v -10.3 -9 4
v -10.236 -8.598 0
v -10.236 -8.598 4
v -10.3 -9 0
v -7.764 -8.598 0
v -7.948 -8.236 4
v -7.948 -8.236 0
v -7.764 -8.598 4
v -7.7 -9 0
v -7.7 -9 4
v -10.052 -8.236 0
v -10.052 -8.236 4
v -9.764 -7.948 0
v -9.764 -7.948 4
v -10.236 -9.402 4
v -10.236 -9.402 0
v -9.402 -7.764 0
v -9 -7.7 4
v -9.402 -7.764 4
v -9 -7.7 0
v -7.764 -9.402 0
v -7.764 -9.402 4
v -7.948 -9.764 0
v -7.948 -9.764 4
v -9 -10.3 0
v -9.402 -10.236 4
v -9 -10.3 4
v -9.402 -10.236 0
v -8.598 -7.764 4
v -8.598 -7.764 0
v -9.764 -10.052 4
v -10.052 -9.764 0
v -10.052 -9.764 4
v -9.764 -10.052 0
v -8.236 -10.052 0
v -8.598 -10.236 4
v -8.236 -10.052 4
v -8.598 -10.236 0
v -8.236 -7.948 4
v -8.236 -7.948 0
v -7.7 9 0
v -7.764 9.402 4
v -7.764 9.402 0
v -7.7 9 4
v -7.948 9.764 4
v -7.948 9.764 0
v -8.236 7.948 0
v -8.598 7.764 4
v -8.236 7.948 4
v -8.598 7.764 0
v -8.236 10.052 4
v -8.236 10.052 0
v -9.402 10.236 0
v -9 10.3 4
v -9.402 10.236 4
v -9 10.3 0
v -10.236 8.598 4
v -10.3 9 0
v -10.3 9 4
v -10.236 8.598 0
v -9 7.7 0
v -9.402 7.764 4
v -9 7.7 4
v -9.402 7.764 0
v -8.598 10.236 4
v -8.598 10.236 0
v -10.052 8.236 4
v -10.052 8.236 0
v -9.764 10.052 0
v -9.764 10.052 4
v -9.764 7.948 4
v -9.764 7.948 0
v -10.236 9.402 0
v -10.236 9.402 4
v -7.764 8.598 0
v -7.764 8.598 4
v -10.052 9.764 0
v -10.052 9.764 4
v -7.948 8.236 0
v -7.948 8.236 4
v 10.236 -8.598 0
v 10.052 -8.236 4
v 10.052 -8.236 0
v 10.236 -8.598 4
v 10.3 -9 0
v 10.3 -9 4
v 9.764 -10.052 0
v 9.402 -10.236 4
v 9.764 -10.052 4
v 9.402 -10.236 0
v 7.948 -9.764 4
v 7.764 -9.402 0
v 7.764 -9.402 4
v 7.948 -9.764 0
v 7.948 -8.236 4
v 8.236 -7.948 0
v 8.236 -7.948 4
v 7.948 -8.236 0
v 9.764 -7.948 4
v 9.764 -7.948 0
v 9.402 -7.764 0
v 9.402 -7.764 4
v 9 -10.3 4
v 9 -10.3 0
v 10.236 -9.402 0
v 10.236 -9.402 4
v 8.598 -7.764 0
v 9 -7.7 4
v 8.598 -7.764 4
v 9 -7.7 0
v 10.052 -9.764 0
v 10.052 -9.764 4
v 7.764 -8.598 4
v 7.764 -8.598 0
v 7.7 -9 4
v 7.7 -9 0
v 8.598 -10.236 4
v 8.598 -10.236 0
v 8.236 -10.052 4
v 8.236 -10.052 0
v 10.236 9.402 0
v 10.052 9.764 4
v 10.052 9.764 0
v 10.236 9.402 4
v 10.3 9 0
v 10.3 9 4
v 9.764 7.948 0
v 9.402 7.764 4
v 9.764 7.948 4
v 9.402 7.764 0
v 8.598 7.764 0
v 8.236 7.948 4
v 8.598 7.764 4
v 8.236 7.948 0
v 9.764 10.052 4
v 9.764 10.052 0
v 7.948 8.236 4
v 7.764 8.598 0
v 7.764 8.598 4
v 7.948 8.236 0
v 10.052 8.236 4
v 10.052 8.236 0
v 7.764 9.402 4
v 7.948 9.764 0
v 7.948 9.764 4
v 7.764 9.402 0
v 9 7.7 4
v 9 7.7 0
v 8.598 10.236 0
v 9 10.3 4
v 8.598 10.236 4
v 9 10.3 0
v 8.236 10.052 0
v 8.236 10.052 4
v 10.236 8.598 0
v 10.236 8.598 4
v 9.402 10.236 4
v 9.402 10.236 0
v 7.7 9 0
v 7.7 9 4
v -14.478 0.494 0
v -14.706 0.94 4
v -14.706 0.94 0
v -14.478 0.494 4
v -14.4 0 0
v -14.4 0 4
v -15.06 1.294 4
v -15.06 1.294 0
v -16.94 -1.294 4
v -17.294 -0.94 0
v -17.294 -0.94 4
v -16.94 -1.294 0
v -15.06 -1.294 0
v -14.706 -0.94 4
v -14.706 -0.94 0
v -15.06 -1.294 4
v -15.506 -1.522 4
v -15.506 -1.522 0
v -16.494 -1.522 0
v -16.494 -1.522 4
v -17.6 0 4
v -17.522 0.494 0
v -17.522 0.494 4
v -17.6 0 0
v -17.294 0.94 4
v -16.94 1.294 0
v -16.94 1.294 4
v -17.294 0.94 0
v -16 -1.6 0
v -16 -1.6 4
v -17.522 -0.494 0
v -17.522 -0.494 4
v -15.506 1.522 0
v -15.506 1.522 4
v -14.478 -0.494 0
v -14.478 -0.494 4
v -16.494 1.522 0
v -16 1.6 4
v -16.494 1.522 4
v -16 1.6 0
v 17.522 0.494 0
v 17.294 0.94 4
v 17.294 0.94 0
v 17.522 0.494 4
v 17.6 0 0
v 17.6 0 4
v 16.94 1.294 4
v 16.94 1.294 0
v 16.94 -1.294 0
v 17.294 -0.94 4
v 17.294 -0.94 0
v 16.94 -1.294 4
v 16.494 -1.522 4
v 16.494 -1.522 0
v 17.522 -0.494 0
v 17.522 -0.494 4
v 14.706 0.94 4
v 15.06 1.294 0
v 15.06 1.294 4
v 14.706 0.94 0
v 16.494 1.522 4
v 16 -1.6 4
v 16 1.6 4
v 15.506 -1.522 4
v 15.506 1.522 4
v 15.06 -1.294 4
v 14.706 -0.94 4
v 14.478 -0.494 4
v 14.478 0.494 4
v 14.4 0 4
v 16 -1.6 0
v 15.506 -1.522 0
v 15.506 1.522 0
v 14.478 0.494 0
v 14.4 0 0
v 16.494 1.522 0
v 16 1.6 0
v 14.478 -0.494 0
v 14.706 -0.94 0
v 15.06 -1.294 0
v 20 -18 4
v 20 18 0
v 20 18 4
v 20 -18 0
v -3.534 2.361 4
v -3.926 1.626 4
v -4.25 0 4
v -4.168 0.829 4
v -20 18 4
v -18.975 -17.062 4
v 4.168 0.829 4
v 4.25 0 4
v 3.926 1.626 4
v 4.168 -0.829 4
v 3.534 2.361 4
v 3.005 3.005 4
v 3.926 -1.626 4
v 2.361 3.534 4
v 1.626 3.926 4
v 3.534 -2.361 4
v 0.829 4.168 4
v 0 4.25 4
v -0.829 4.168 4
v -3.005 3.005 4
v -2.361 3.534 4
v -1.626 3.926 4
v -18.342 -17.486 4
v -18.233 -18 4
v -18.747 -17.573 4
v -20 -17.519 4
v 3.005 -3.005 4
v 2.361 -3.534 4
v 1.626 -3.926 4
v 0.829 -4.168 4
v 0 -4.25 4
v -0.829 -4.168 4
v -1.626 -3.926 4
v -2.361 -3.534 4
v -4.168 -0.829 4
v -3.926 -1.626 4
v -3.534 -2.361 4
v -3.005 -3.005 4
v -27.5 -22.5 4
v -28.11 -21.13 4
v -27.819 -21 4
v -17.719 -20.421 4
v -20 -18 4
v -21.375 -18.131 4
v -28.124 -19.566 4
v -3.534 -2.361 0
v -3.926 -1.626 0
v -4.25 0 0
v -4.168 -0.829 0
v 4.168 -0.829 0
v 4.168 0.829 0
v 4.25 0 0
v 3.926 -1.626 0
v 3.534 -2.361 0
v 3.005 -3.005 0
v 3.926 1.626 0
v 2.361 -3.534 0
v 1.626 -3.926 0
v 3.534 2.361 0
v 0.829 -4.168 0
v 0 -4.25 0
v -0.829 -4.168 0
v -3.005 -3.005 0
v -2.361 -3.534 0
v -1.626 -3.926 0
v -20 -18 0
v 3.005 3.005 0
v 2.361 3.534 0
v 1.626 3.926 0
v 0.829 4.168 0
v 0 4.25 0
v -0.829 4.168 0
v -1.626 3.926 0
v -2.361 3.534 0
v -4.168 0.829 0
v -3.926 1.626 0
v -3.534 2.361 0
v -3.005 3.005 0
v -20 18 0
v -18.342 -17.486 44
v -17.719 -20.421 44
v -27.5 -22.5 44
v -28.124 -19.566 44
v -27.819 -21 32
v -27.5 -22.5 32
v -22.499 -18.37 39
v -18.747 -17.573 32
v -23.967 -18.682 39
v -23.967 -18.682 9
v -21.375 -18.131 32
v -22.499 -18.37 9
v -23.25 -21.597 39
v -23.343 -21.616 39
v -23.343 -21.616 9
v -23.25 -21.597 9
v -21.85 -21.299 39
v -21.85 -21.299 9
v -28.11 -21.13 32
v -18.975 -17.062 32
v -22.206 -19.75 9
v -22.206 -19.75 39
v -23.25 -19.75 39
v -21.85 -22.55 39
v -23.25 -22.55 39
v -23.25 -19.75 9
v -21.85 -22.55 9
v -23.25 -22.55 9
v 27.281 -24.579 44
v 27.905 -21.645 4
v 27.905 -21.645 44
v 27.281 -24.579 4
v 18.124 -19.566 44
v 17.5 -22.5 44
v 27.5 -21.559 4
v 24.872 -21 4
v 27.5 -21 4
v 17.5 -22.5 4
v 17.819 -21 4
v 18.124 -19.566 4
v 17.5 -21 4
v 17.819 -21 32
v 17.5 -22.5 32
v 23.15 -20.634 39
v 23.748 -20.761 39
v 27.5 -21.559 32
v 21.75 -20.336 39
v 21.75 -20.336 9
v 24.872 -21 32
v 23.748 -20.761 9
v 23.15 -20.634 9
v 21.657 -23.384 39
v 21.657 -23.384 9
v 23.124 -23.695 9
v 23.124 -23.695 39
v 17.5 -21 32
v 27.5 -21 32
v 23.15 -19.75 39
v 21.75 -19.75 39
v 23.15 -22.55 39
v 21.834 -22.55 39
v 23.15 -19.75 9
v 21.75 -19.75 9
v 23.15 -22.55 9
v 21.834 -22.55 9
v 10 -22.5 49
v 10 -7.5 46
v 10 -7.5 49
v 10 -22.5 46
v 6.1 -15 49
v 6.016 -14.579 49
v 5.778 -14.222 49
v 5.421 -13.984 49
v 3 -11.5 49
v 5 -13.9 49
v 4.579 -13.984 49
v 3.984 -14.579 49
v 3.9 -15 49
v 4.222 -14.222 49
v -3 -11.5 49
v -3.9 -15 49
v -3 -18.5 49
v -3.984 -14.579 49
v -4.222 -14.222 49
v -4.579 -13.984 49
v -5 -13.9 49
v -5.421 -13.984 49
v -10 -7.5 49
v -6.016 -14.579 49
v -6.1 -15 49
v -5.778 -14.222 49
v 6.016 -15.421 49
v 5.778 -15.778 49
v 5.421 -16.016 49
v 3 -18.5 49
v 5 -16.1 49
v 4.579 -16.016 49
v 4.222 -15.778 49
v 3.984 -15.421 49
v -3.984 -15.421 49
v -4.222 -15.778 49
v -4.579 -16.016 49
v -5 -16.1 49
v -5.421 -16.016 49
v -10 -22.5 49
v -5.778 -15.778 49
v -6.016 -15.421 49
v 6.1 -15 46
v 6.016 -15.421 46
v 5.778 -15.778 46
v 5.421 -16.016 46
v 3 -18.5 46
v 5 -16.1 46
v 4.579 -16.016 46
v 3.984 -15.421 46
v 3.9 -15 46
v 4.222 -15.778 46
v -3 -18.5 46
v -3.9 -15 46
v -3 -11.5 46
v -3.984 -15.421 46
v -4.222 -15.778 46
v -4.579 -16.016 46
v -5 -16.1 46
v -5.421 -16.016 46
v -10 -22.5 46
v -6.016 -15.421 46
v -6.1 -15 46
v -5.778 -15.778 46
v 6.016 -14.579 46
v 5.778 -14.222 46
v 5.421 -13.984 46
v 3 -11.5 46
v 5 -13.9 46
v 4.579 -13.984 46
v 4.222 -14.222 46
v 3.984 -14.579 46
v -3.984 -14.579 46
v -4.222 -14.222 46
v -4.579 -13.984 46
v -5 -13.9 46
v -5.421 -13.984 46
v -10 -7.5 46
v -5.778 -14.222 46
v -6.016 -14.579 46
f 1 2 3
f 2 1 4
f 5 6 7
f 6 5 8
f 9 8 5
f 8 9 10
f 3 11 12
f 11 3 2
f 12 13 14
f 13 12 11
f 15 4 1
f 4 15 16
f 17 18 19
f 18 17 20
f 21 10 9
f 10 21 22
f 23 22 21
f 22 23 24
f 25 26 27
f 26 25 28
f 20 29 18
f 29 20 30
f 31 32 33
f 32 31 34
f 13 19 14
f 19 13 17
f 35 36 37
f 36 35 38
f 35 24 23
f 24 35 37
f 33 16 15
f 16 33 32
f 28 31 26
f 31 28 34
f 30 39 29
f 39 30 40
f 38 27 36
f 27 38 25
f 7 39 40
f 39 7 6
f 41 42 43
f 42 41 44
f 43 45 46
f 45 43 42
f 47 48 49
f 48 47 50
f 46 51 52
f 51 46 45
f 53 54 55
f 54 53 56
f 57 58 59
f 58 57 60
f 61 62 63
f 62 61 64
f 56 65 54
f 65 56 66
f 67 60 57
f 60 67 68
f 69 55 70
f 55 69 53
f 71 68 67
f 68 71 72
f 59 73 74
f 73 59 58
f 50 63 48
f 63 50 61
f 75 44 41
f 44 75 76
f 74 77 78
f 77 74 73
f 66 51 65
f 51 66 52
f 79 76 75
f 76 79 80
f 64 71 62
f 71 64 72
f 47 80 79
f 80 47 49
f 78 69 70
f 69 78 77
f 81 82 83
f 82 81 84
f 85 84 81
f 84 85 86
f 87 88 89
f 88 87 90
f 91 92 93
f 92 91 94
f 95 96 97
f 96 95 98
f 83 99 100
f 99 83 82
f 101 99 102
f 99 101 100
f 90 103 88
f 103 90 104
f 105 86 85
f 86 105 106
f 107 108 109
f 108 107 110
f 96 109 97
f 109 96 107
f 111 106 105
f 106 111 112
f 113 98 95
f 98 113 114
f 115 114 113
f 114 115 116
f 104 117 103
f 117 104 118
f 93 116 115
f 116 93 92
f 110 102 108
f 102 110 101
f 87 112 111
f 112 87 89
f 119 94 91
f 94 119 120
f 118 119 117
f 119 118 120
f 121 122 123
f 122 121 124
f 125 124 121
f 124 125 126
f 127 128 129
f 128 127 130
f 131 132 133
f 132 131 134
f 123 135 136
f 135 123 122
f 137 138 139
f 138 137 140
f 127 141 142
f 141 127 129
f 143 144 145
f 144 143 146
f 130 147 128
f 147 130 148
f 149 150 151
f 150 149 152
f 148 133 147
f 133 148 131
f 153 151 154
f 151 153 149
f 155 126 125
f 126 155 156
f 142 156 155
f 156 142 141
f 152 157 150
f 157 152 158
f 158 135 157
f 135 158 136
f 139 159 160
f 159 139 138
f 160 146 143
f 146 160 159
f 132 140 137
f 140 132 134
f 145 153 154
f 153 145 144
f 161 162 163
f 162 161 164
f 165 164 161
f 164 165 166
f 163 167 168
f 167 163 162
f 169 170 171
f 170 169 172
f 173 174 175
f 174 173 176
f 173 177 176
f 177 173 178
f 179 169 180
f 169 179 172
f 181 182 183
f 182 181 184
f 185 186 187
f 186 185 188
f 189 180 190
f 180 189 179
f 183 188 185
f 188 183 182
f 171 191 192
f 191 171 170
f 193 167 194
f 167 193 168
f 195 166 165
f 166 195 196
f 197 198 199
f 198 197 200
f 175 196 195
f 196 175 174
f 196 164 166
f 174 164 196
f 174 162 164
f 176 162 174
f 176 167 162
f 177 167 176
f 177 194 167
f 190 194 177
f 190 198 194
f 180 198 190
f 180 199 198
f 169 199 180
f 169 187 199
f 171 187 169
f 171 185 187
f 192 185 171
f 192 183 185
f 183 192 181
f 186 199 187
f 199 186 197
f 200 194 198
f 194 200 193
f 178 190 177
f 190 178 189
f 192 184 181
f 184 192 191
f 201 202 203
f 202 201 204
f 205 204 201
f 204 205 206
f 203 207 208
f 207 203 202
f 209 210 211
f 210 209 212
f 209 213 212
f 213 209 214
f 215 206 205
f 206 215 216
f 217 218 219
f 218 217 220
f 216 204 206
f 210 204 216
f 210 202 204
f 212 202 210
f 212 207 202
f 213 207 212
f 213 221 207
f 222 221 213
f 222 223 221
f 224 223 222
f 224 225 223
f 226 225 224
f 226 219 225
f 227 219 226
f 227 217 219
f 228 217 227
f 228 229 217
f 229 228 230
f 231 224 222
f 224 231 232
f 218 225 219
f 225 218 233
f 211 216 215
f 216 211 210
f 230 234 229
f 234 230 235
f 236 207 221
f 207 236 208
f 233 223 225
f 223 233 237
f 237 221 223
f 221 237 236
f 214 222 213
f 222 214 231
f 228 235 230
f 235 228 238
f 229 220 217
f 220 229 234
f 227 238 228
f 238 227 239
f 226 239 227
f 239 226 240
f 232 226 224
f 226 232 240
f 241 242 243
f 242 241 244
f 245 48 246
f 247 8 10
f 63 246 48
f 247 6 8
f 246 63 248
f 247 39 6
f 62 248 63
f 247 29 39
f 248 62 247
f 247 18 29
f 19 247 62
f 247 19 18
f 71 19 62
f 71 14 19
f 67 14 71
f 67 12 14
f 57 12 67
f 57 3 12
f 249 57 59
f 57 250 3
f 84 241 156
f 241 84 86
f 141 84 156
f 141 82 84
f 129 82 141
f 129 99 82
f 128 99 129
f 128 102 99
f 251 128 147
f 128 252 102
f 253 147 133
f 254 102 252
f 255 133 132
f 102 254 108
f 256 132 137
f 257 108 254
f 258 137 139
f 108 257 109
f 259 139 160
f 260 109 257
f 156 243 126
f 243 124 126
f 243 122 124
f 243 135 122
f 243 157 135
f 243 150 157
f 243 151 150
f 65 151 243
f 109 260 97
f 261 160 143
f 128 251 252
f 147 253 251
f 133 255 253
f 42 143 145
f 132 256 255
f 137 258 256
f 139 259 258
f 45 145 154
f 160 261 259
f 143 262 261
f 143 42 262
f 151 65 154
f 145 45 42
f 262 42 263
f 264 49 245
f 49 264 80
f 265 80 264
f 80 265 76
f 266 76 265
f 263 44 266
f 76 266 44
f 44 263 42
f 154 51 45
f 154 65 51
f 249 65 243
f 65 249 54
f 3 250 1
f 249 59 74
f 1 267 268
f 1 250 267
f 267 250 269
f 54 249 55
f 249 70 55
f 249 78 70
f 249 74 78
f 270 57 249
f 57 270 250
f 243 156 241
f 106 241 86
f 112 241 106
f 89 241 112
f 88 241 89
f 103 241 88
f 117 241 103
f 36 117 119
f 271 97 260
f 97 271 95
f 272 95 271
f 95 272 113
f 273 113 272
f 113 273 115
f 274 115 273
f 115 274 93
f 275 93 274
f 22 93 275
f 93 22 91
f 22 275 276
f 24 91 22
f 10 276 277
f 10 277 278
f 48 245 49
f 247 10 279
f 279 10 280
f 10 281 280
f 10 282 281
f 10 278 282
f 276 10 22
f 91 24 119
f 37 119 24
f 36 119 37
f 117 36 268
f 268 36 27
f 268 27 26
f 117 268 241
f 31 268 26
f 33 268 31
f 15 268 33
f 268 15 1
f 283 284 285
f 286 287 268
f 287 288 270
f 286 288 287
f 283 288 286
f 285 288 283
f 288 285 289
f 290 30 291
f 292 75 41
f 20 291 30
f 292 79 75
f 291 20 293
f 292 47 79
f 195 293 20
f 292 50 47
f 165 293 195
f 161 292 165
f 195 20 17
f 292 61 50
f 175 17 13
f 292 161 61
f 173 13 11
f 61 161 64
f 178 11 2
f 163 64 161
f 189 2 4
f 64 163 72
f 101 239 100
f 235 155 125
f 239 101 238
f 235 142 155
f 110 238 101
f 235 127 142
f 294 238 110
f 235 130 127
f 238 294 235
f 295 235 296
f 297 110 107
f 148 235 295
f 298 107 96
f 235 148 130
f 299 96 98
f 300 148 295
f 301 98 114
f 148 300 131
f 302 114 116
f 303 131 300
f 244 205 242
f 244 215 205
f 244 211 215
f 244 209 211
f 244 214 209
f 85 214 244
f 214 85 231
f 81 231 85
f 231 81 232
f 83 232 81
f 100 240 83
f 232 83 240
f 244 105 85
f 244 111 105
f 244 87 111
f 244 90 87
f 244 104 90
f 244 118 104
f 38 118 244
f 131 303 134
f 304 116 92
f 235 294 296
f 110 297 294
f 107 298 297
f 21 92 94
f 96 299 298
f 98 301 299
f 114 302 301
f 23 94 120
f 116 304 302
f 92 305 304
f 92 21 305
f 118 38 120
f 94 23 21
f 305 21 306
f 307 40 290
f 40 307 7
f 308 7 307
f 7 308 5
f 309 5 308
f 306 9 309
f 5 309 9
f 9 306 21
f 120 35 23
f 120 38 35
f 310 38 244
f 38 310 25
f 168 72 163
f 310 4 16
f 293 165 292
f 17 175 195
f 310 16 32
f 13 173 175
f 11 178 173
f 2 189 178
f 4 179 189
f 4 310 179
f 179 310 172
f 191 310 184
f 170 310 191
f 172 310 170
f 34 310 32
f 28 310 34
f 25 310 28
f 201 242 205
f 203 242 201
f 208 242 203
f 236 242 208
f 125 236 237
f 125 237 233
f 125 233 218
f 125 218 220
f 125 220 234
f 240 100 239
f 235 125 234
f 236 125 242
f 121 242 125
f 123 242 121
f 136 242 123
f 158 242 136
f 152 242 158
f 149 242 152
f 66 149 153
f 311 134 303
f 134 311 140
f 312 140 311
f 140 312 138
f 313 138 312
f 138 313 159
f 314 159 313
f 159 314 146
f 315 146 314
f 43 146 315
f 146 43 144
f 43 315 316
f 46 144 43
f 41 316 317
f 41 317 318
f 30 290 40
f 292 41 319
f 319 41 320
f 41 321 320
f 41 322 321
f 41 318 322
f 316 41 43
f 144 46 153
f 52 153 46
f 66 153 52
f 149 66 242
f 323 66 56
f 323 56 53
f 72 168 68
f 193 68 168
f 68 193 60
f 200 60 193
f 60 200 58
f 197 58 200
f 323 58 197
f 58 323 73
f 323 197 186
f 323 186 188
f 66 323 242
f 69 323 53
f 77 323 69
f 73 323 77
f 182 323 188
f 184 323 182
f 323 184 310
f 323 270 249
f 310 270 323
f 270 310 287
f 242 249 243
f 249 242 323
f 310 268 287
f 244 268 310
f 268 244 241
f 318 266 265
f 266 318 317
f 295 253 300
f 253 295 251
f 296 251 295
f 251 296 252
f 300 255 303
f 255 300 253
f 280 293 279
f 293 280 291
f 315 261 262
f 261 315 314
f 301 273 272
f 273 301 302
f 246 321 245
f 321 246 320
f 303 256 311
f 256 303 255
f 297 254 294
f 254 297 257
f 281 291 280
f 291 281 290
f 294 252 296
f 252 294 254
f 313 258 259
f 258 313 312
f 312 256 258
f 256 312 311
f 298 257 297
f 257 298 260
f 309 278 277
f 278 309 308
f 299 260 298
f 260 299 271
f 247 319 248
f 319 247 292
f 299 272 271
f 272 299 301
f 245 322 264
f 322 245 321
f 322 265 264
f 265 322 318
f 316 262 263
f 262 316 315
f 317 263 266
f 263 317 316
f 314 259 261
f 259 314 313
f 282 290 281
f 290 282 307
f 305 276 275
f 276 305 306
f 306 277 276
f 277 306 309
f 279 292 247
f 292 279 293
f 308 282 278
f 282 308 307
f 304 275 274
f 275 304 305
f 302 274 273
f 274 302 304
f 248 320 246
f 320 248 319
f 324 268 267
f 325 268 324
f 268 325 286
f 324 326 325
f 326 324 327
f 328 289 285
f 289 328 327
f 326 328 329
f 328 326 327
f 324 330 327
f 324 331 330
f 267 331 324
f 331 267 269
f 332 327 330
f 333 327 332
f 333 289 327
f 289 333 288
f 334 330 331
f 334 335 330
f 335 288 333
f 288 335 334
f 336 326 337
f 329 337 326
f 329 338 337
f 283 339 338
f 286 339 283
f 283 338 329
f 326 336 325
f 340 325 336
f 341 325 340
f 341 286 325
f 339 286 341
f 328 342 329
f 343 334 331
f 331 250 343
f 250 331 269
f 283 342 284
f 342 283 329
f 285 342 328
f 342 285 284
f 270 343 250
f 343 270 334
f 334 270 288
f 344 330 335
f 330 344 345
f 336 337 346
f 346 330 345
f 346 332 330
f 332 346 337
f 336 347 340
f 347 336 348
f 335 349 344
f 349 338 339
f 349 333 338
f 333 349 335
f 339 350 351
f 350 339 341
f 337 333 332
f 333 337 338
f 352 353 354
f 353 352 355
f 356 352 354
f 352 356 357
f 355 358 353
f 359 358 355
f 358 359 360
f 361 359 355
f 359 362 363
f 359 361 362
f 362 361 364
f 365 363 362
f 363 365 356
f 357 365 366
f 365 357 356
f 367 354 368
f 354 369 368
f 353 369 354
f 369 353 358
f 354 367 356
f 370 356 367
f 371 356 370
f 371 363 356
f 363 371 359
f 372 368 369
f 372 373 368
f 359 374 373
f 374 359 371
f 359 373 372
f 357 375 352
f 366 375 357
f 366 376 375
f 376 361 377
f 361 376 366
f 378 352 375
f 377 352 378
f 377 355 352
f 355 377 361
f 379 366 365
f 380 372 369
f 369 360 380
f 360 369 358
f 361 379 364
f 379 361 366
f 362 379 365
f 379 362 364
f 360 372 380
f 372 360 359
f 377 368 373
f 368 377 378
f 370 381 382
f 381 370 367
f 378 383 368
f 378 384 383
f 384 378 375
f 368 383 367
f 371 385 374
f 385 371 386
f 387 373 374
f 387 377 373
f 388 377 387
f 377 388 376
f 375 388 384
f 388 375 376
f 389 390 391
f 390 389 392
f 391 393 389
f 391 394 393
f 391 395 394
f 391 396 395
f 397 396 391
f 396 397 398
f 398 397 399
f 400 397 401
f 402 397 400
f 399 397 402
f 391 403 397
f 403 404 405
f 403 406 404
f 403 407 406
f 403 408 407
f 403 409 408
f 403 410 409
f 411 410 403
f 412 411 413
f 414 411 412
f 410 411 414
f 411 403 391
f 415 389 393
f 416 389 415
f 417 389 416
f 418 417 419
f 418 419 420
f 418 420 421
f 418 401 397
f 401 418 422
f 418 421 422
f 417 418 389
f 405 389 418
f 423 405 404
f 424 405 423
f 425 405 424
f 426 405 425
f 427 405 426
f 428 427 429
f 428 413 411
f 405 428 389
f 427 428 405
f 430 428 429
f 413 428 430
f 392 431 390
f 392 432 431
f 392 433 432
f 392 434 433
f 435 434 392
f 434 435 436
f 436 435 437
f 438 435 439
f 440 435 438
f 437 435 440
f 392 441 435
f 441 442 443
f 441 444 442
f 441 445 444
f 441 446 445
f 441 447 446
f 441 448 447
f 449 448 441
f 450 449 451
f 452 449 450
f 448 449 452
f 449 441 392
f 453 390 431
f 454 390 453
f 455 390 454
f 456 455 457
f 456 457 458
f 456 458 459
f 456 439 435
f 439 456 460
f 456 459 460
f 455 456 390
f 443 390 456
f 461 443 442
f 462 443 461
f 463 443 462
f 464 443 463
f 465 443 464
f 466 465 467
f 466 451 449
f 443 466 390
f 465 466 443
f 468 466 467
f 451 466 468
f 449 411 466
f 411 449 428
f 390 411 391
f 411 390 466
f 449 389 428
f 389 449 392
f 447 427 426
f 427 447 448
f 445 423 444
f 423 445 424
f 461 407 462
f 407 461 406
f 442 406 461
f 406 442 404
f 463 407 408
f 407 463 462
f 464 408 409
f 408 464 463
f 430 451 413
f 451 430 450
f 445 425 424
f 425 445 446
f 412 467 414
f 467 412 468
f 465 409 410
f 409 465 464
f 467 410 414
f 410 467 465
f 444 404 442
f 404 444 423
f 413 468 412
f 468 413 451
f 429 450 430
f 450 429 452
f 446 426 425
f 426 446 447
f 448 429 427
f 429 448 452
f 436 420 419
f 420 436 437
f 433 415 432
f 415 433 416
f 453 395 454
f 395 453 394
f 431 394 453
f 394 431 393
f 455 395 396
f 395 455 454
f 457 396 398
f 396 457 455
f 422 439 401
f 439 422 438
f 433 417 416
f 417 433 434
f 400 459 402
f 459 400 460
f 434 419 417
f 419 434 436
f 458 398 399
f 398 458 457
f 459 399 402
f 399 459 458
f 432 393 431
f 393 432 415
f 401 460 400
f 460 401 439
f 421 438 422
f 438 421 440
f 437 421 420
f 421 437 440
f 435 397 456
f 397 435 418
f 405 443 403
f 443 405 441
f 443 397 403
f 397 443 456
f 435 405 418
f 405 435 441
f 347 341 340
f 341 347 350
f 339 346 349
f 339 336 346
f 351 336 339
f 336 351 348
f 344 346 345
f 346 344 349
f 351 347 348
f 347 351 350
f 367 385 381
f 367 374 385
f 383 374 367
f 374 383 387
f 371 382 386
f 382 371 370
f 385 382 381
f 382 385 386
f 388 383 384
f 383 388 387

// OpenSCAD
// file: config_objetos.scad
// =====================================================
// CONFIGURACIÓN DE DIMENSIONES — WRO Junior 2026
// Heritage Heroes — Objetos del juego
// =====================================================
//
// ⚠️ MEDIDAS ESTIMADAS — ACTUALIZAR CON CALIBRE DIGITAL
// Después de armar los objetos reales, medir y reemplazar
// los valores marcados con // MEDIR
//
// Sistema LEGO:
//   1 stud = 8mm pitch
//   1 plate = 3.2mm alto
//   1 brick = 9.6mm alto (3 plates)
//   Ancho pieza = studs × 8 - 0.2mm
// =====================================================

// --- Visitantes (el más ancho define apertura mínima de garra) ---
visitante_ancho = 24;    // mm, ~3 studs // MEDIR
visitante_prof  = 16;    // mm, ~2 studs // MEDIR
visitante_alto  = 48;    // mm, ~5 bricks // MEDIR

// --- Torre amarilla BASE (fija en el campo, NO se mueve) ---
torre_am_base_ancho = 32;   // mm, ~4 studs // MEDIR
torre_am_base_prof  = 32;   // mm, ~4 studs // MEDIR
torre_am_base_alto  = 32;   // mm, ~3.3 bricks // MEDIR
torre_am_base_studs = 16;   // mm, zona de encaje 2×2 studs // MEDIR

// --- Torre amarilla TECHO (el robot la recoge y apila) ---
torre_am_top_ancho = 32;    // mm // MEDIR
torre_am_top_prof  = 32;    // mm // MEDIR
torre_am_top_alto  = 32;    // mm // MEDIR
torre_am_top_hueco = 16.2;  // mm, hueco inferior para encajar // MEDIR CRITICO

// --- Torres rojas (se transportan completas) ---
torre_roja_ancho = 24;   // mm, ~3 studs // MEDIR
torre_roja_prof  = 24;   // mm // MEDIR
torre_roja_alto  = 58;   // mm, ~6 bricks // MEDIR

// --- Artefactos (5 colores, base idéntica) ---
artefacto_ancho = 16;    // mm, ~2 studs // MEDIR
artefacto_prof  = 16;    // mm // MEDIR
artefacto_alto  = 32;    // mm, ~3.3 bricks // MEDIR

// --- Partículas de suciedad (para dimensionar la pala) ---
dirt_diametro = 8;       // mm, 1×1 round // MEDIR
dirt_alto     = 3.2;     // mm, 1 plate // MEDIR

// --- El objeto más ancho define la apertura de la garra ---
objeto_max_ancho = max(visitante_ancho, torre_am_top_ancho, 
                       torre_roja_ancho, artefacto_ancho);

echo(str("Objeto más ancho: ", objeto_max_ancho, "mm"));
echo(str("Apertura mínima garra: ", objeto_max_ancho + 10, "mm"));
// main file
// =====================================================
// GARRA TIPO V PARA DYNAMIXEL XL330-M288-T
// WRO Junior 2026 — Heritage Heroes
// =====================================================
// Diseño: pinza convergente en V con dedos PLA + TPU
// Motor: Dynamixel XL330-M288-T (20×34×26mm, eje 8mm)
// Montaje: frames ROBOTIS FPX330-H101
// =====================================================

use <config_objetos.scad>

// === PARÁMETROS DE LA GARRA (ajustar según pruebas) ===

// Apertura
garra_apertura_max = 55;      // mm, apertura total cuando abierta
garra_apertura_min = 10;      // mm, apertura cuando cerrada al máximo
garra_angulo_v     = 12;      // grados, ángulo de convergencia V

// Dedos
dedo_largo    = 45;           // mm, largo del dedo desde pivote
dedo_ancho    = 10;           // mm, ancho del dedo (perfil)
dedo_alto     = 40;           // mm, profundidad del dedo (para agarrar objetos altos)
dedo_espesor  = 3;            // mm, espesor pared del dedo

// Grip TPU
tpu_espesor   = 1.5;          // mm, espesor del recubrimiento TPU
tpu_alto      = 30;           // mm, altura de la zona de grip

// Dynamixel XL330
xl330_ancho   = 20;           // mm (datasheet)
xl330_largo   = 34;           // mm (datasheet)
xl330_alto    = 26;           // mm (datasheet)
xl330_eje_d   = 8;            // mm, diámetro del eje de salida
xl330_mount_d = 2.5;          // mm, tornillos de montaje M2.5
xl330_mount_sep = 18;         // mm, distancia entre agujeros de montaje

// Base de montaje
base_ancho = 40;              // mm
base_largo = 36;              // mm  
base_alto  = 4;               // mm, espesor placa base

// Insertos metálicos
inserto_d = 3.2;              // mm, diámetro agujero para inserto M2
inserto_h = 4;                // mm, profundidad del inserto

// === MÓDULOS ===

module dedo_pla() {
    // Cuerpo del dedo en PLA
    // Forma: L invertida — parte vertical agarra, parte horizontal monta
    difference() {
        union() {
            // Parte vertical del dedo (la que agarra)
            cube([dedo_ancho, dedo_espesor, dedo_alto]);
            
            // Labio interior en V (guía el objeto al centro)
            translate([0, 0, 0])
                rotate([0, 0, garra_angulo_v])
                    cube([dedo_ancho, dedo_espesor/2, dedo_alto * 0.7]);
        }
        
        // Ranura para insert TPU
        translate([dedo_ancho/2 - tpu_espesor/2, -0.1, 
                   (dedo_alto - tpu_alto)/2])
            cube([tpu_espesor, dedo_espesor + 0.2, tpu_alto]);
    }
}

module tpu_grip() {
    // Pieza de TPU que se inserta en la ranura del dedo PLA
    // Imprime por separado en TPU 95A
    cube([tpu_espesor - 0.1, dedo_espesor - 0.2, tpu_alto]);
}

module base_montaje_xl330() {
    difference() {
        // Placa base
        translate([-base_ancho/2, -base_largo/2, 0])
            cube([base_ancho, base_largo, base_alto]);
        
        // Agujero central para eje XL330
        translate([0, 0, -0.1])
            cylinder(d=xl330_eje_d + 0.5, h=base_alto + 0.2, $fn=32);
        
        // Agujeros de montaje XL330 (patrón cuadrado)
        for (dx = [-xl330_mount_sep/2, xl330_mount_sep/2])
            for (dy = [-xl330_mount_sep/2, xl330_mount_sep/2])
                translate([dx, dy, -0.1])
                    cylinder(d=xl330_mount_d + 0.1, h=base_alto + 0.2, $fn=20);
        
        // Agujeros para montaje al brazo (M2 insertos)
        for (dx = [-base_ancho/2 + 4, base_ancho/2 - 4])
            translate([dx, 0, -0.1])
                cylinder(d=inserto_d, h=inserto_h + 0.1, $fn=20);
    }
}

module soporte_sensor_color() {
    // Soporte para TCS34725 montado entre los dedos
    // El sensor mira hacia el objeto cuando la garra está abierta
    difference() {
        cube([20, 15, 3]);
        // Agujeros montaje sensor (M2)
        translate([5, 7.5, -0.1]) cylinder(d=2.2, h=3.2, $fn=16);
        translate([15, 7.5, -0.1]) cylinder(d=2.2, h=3.2, $fn=16);
        // Ventana para el sensor
        translate([7, 4, -0.1]) cube([6, 7, 3.2]);
    }
}

module garra_completa() {
    // Ensamble completo de la garra
    
    // Base de montaje
    color("gray") base_montaje_xl330();
    
    // Dedo izquierdo
    color("white")
        translate([-garra_apertura_max/2, -dedo_largo/2, base_alto])
            rotate([0, 0, garra_angulo_v])
                dedo_pla();
    
    // Dedo derecho (espejado)
    color("white")
        translate([garra_apertura_max/2 - dedo_ancho, -dedo_largo/2, base_alto])
            rotate([0, 0, -garra_angulo_v])
                dedo_pla();
    
    // TPU grips (color naranja para visualizar)
    color("orange", 0.7)
        translate([-garra_apertura_max/2 + dedo_ancho/2 - tpu_espesor/2, 
                   -dedo_largo/2 - 0.05, 
                   base_alto + (dedo_alto - tpu_alto)/2])
            tpu_grip();
    
    color("orange", 0.7)
        translate([garra_apertura_max/2 - dedo_ancho/2 - tpu_espesor/2, 
                   -dedo_largo/2 - 0.05, 
                   base_alto + (dedo_alto - tpu_alto)/2])
            tpu_grip();
    
    // Soporte sensor color (entre dedos, arriba)
    color("green", 0.5)
        translate([-10, -dedo_largo/2, base_alto + dedo_alto + 2])
            soporte_sensor_color();
}

// === RENDER ===
garra_completa();

// === EXPORTAR PIEZAS INDIVIDUALES ===
// Descomentar UNA línea a la vez para exportar cada pieza como STL:
// dedo_pla();              // → dedo_pla.stl (imprimir ×2 en PLA+)
// tpu_grip();              // → tpu_grip.stl (imprimir ×2 en TPU 95A)
// base_montaje_xl330();    // → base_montaje.stl (imprimir ×1 en PLA+)
// soporte_sensor_color();  // → soporte_sensor.stl (imprimir ×1 en PLA)
